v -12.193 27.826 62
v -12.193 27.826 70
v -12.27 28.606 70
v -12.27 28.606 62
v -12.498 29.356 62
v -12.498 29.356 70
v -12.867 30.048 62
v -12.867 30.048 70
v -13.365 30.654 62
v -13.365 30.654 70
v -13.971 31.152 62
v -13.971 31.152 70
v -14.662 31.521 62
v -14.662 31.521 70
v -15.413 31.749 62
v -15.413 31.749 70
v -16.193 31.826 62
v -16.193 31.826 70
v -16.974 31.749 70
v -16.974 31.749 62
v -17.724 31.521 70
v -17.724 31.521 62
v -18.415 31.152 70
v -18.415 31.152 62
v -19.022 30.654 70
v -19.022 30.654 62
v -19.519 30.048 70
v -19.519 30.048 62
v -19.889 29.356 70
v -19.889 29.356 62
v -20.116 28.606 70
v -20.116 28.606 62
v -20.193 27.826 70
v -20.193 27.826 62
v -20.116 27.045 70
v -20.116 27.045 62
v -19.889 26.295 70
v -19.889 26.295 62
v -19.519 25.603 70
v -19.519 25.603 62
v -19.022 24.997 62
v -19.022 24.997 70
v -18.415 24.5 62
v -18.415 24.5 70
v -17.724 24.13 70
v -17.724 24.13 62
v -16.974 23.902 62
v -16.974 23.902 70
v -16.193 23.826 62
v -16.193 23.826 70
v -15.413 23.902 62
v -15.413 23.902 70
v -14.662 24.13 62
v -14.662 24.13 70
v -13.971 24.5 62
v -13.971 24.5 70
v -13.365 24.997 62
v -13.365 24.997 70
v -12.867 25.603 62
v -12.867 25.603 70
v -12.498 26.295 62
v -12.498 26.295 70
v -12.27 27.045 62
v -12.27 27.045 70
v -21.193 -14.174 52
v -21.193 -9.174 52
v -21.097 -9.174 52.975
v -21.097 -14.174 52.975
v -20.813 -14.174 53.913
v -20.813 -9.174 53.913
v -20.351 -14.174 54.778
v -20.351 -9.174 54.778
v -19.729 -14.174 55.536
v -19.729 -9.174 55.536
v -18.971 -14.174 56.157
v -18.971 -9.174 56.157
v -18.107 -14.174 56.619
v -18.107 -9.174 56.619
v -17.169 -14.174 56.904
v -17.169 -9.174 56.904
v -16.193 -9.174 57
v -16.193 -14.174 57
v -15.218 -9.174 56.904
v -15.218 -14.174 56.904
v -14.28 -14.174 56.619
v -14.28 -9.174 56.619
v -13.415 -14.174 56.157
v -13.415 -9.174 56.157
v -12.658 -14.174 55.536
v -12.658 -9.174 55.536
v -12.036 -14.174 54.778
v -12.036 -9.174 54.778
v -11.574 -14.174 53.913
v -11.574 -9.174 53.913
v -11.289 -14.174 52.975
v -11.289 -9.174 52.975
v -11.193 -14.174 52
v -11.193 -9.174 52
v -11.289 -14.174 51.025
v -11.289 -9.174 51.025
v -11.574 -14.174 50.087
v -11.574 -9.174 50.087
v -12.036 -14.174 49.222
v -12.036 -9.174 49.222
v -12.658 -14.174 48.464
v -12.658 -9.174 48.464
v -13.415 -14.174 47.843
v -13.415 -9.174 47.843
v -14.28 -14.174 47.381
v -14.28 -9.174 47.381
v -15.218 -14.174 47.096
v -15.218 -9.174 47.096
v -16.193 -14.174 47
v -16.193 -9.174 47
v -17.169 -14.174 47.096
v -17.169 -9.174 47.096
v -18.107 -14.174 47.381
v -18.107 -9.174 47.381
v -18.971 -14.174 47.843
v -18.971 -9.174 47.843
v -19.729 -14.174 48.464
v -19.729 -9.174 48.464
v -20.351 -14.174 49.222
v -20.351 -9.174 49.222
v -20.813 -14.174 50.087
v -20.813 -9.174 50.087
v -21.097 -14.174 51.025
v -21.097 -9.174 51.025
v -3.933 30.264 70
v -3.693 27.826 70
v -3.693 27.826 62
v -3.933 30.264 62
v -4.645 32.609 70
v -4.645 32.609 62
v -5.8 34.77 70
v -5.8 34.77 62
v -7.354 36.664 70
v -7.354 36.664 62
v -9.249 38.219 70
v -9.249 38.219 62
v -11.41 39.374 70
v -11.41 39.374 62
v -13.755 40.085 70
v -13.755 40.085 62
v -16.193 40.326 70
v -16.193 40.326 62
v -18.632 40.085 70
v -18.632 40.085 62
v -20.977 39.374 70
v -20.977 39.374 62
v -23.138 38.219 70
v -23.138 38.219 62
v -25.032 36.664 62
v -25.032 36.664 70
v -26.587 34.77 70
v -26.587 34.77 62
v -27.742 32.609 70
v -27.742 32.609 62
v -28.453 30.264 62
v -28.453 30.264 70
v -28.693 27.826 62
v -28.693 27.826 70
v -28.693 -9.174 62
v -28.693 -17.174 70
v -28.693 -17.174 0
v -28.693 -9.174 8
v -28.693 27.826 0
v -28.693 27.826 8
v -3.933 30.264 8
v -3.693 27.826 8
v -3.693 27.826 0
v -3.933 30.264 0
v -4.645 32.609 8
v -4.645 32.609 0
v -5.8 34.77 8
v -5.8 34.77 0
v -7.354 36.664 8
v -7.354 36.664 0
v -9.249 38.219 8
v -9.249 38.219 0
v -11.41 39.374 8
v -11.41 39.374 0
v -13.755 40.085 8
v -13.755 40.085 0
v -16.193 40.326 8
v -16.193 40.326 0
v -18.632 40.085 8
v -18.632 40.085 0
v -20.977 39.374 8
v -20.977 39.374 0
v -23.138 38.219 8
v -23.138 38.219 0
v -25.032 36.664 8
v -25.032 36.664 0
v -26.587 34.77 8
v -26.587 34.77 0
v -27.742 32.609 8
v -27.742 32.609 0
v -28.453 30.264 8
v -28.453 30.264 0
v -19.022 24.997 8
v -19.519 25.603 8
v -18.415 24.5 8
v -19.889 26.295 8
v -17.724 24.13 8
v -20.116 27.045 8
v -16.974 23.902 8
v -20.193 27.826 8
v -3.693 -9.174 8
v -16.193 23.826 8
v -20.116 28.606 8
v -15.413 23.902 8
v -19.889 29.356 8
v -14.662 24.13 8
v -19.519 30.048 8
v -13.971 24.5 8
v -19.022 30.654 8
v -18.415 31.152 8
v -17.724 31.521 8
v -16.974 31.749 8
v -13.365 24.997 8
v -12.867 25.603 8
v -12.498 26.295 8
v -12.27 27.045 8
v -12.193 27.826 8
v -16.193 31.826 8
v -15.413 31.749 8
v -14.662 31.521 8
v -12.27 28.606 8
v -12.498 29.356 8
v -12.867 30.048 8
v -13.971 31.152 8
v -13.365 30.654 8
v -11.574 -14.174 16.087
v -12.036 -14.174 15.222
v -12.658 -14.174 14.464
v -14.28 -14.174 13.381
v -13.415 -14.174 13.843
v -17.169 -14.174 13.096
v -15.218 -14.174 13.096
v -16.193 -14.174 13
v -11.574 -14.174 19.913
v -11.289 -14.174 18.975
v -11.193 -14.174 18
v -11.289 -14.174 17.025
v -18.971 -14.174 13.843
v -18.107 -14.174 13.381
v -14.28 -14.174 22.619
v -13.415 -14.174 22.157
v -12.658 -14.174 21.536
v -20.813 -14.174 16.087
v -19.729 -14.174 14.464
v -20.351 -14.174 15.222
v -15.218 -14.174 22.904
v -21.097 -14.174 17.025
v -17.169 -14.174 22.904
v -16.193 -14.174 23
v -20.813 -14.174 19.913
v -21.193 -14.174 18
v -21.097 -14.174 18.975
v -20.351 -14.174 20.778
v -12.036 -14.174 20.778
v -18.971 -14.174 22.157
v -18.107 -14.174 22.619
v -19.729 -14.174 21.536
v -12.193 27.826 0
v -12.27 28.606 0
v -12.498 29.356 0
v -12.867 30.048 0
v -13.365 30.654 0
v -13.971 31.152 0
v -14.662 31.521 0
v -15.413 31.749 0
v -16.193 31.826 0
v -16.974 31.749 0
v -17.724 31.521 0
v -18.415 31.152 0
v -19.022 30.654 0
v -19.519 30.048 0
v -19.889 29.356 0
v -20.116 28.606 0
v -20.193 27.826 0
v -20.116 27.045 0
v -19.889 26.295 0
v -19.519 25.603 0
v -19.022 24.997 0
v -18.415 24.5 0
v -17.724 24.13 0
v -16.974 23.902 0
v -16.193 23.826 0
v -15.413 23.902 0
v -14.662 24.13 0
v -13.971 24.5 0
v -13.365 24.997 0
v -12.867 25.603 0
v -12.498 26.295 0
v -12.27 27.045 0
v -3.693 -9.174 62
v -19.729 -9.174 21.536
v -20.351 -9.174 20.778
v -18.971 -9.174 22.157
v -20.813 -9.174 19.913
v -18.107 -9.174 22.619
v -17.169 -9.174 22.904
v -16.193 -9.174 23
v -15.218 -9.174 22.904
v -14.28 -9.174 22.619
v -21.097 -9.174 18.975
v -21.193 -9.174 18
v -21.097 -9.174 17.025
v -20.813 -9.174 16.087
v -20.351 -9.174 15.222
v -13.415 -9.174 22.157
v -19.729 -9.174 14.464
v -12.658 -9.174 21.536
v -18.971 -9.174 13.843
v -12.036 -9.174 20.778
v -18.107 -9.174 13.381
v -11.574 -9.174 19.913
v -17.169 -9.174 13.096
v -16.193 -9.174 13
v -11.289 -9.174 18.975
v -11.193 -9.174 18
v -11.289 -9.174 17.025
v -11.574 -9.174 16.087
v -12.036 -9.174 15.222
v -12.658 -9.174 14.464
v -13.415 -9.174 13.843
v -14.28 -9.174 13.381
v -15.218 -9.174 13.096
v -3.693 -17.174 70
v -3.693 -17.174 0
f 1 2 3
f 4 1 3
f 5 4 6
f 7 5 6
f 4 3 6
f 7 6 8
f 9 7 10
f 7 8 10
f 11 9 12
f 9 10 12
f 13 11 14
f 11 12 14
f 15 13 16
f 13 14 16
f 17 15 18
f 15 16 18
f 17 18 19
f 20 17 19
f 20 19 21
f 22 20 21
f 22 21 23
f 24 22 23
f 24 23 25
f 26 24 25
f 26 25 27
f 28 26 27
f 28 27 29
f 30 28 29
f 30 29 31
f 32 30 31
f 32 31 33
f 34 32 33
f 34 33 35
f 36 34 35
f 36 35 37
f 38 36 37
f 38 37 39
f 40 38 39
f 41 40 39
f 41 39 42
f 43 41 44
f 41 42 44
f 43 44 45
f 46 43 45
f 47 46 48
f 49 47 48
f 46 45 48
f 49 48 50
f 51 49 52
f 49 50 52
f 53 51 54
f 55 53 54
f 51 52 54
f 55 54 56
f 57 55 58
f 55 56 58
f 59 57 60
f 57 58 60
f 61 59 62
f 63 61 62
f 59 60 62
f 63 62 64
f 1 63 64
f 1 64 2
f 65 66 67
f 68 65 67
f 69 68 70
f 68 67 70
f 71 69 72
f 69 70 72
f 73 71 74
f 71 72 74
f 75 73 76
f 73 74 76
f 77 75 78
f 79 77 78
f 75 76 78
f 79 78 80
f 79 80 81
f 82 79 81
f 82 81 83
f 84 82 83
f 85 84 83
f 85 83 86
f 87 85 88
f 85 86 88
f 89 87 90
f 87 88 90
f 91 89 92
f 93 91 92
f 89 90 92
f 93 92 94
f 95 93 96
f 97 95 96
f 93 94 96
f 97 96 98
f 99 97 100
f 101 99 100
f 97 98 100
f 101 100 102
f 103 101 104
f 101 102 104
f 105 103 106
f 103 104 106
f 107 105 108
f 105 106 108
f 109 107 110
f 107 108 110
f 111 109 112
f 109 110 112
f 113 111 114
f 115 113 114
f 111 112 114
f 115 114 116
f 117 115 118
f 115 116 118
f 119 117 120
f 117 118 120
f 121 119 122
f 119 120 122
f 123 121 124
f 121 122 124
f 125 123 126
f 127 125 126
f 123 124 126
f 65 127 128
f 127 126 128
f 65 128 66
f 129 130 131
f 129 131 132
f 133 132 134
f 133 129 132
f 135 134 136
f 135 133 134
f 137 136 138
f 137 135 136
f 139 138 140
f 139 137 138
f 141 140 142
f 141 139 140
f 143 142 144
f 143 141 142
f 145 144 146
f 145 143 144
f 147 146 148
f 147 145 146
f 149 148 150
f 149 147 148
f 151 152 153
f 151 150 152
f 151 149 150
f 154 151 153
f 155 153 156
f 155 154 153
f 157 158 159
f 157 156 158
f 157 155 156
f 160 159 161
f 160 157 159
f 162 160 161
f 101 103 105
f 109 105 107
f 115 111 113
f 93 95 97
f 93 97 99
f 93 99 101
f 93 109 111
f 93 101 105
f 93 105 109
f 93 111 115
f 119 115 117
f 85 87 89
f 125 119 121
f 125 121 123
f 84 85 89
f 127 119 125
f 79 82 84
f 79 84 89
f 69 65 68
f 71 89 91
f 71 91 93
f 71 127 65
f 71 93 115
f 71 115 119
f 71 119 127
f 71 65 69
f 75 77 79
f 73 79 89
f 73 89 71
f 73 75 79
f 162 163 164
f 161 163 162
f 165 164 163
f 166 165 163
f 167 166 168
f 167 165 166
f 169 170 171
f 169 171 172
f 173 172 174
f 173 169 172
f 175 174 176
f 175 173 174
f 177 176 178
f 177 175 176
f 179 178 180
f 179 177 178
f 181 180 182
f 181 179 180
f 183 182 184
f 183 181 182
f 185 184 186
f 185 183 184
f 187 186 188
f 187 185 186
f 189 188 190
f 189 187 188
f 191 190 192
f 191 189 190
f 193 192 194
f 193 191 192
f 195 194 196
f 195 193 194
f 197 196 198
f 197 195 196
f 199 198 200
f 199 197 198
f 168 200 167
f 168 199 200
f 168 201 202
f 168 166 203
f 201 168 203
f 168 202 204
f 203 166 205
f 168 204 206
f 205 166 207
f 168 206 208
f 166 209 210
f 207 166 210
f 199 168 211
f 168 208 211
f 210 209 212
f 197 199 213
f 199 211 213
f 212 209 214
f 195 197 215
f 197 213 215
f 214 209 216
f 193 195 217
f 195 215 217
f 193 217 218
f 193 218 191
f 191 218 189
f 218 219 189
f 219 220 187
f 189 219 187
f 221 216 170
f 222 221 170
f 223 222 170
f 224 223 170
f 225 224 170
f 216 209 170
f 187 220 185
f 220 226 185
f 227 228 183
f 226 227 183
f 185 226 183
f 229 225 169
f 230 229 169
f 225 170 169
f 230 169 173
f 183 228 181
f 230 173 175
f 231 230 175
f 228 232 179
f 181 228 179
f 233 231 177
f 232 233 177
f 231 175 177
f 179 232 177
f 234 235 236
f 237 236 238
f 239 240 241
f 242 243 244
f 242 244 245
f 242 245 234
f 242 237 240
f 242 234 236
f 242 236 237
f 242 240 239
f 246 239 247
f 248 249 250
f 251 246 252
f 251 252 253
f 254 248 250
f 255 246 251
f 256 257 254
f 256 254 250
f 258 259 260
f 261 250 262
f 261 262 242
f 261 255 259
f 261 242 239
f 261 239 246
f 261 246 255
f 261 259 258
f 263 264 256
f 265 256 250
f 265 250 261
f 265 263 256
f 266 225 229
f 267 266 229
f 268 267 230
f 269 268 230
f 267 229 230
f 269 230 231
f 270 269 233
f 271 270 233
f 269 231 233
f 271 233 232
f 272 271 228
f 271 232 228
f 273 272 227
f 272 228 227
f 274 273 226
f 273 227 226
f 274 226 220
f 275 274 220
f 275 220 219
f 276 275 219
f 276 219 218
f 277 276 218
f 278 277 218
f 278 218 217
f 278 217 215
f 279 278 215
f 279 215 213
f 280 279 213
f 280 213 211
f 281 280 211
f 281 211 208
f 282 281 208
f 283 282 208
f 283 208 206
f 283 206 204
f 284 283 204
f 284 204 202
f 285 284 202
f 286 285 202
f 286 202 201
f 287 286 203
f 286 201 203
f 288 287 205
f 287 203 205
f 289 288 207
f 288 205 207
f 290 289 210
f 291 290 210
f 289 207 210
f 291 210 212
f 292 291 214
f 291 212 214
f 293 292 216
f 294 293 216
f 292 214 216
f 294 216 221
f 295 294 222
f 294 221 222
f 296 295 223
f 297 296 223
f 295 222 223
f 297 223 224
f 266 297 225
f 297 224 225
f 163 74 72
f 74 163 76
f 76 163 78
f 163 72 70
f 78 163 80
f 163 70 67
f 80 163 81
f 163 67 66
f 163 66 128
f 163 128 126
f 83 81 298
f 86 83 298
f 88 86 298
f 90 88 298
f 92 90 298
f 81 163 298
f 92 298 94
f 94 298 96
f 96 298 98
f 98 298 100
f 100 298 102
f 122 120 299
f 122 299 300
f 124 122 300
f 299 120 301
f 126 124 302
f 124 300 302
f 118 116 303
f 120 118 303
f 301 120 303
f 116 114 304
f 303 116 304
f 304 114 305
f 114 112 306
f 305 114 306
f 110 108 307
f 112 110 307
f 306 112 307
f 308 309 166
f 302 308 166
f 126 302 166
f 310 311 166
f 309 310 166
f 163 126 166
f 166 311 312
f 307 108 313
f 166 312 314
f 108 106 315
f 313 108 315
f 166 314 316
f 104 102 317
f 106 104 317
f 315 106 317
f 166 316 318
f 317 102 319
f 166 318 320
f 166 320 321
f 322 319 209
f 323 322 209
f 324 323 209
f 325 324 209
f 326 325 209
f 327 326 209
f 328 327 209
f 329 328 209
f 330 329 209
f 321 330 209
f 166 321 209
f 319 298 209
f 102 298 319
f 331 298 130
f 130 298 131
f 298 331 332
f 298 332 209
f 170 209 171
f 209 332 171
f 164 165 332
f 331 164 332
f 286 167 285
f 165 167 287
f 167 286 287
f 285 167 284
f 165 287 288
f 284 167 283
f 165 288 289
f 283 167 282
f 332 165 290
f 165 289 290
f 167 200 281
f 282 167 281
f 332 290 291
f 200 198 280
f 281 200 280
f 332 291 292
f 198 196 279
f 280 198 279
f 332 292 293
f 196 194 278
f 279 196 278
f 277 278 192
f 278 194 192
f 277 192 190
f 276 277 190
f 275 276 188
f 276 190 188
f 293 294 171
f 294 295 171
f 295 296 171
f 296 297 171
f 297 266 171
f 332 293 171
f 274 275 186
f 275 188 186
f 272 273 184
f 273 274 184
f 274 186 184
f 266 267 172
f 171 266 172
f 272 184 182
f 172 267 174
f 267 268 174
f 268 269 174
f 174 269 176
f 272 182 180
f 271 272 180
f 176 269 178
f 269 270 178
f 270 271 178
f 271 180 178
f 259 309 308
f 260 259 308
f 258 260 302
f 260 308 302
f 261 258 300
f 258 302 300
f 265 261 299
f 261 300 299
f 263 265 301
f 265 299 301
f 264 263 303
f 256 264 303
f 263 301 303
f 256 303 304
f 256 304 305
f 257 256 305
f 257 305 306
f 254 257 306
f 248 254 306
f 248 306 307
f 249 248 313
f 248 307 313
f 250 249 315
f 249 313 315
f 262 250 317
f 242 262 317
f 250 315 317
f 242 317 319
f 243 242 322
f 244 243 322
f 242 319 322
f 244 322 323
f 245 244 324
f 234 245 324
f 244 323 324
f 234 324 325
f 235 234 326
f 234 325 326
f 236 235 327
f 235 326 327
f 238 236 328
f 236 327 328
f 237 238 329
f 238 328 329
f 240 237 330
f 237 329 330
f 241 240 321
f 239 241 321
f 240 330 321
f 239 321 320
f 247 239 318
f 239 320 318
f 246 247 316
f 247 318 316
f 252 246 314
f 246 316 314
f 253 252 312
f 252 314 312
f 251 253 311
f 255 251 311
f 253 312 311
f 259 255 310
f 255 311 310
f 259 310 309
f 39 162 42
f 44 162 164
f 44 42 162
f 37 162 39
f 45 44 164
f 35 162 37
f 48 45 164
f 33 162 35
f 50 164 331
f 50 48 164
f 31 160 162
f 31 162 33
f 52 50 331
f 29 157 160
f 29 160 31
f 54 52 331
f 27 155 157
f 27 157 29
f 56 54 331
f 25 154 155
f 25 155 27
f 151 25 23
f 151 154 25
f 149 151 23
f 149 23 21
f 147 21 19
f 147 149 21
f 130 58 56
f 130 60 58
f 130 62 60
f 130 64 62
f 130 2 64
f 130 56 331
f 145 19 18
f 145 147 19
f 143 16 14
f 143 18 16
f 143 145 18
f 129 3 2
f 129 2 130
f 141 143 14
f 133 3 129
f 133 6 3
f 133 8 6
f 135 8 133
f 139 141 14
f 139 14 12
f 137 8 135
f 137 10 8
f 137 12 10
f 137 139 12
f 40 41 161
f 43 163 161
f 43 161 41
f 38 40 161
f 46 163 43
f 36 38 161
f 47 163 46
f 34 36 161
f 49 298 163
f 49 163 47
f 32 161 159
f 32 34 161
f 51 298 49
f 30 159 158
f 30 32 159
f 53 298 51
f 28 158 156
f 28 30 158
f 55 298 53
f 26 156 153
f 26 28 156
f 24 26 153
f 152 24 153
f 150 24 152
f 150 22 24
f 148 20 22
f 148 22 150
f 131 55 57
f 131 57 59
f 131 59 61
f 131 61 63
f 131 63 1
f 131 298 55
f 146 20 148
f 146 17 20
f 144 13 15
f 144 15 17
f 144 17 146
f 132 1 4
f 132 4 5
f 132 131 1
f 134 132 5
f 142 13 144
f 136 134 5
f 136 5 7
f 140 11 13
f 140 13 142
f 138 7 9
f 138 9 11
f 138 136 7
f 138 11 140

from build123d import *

# Parameters (mm, degrees)
IZIM1_W                     = 25
IZIM1_H                     = 57.5
Y_KSEKLIK_EKSTR_ZYON1_DEPTH = 70
RADYUS1_RADIUS              = 12.5
RADYUS1_LENGTH              = 70
IZIM3_W                     = 54
IZIM3_H                     = 49.5
KES_EKSTR_ZYON1_DEPTH       = 85.564510613
IZIM4_R                     = 5
KES_EKSTR_ZYON2_DEPTH       = 5
IZIM5_R                     = 4
KES_EKSTR_ZYON3_DEPTH       = 86.728971246


with BuildPart() as part:
    # Çizim1 → Yükseklik-Ekstrüzyon1 (new body)
    with BuildSketch(Plane.XY):
        with Locations((-16.193205739, 11.575630252)):
            Rectangle(IZIM1_W, IZIM1_H)
    extrude(amount=Y_KSEKLIK_EKSTR_ZYON1_DEPTH)

    # Radyus1: full round fillet: the end face becomes a half cylinder, R = half its width
    radyus1_face = Plane((-16.193205739, 40.325630252, 35), x_dir=(0, 0, 1), z_dir=(0, 1, 0))  # on the end face: x along it, z out of the body
    radyus1_slab = radyus1_face.offset(-RADYUS1_RADIUS / 2) * Box(RADYUS1_LENGTH, 2 * RADYUS1_RADIUS, RADYUS1_RADIUS, mode=Mode.PRIVATE)  # the body's end, R deep
    radyus1_round = Plane((-16.193205739, 27.825630252, 35), x_dir=(0, 1, 0), z_dir=(0, 0, 1)) * Cylinder(RADYUS1_RADIUS, RADYUS1_LENGTH, mode=Mode.PRIVATE)  # its axis R under the face
    add(radyus1_slab - radyus1_round, mode=Mode.SUBTRACT)

    # Çizim3 → Kes-Ekstrüzyon1 (cut, through all)
    with BuildSketch(Plane(origin=(-3.693205739, 0, 0), x_dir=(0, 0, -1), z_dir=(1, 0, 0))):
        with Locations((-35, 15.575630252)):
            Rectangle(IZIM3_W, IZIM3_H)
    extrude(amount=-KES_EKSTR_ZYON1_DEPTH, mode=Mode.SUBTRACT)

    # Çizim4 → Kes-Ekstrüzyon2 (cut)
    with BuildSketch(Plane(origin=(0, -9.174369748, 0), x_dir=(1, 0, 0), z_dir=(0, 1, 0))):
        with Locations(Location((-16.193205739, -18, 0), (0, 0, 180))):
            Circle(IZIM4_R)
        with Locations(Location((-16.193205739, -52, 0), (0, 0, 180))):
            Circle(IZIM4_R)
    extrude(amount=-KES_EKSTR_ZYON2_DEPTH, mode=Mode.SUBTRACT)

    # Çizim5 → Kes-Ekstrüzyon3 (cut, through all)
    with BuildSketch(Plane.XY.offset(70)):
        with Locations((-16.193205739, 27.825630252)):
            Circle(IZIM5_R)
    extrude(amount=-KES_EKSTR_ZYON3_DEPTH, mode=Mode.SUBTRACT)


solid = part.part
